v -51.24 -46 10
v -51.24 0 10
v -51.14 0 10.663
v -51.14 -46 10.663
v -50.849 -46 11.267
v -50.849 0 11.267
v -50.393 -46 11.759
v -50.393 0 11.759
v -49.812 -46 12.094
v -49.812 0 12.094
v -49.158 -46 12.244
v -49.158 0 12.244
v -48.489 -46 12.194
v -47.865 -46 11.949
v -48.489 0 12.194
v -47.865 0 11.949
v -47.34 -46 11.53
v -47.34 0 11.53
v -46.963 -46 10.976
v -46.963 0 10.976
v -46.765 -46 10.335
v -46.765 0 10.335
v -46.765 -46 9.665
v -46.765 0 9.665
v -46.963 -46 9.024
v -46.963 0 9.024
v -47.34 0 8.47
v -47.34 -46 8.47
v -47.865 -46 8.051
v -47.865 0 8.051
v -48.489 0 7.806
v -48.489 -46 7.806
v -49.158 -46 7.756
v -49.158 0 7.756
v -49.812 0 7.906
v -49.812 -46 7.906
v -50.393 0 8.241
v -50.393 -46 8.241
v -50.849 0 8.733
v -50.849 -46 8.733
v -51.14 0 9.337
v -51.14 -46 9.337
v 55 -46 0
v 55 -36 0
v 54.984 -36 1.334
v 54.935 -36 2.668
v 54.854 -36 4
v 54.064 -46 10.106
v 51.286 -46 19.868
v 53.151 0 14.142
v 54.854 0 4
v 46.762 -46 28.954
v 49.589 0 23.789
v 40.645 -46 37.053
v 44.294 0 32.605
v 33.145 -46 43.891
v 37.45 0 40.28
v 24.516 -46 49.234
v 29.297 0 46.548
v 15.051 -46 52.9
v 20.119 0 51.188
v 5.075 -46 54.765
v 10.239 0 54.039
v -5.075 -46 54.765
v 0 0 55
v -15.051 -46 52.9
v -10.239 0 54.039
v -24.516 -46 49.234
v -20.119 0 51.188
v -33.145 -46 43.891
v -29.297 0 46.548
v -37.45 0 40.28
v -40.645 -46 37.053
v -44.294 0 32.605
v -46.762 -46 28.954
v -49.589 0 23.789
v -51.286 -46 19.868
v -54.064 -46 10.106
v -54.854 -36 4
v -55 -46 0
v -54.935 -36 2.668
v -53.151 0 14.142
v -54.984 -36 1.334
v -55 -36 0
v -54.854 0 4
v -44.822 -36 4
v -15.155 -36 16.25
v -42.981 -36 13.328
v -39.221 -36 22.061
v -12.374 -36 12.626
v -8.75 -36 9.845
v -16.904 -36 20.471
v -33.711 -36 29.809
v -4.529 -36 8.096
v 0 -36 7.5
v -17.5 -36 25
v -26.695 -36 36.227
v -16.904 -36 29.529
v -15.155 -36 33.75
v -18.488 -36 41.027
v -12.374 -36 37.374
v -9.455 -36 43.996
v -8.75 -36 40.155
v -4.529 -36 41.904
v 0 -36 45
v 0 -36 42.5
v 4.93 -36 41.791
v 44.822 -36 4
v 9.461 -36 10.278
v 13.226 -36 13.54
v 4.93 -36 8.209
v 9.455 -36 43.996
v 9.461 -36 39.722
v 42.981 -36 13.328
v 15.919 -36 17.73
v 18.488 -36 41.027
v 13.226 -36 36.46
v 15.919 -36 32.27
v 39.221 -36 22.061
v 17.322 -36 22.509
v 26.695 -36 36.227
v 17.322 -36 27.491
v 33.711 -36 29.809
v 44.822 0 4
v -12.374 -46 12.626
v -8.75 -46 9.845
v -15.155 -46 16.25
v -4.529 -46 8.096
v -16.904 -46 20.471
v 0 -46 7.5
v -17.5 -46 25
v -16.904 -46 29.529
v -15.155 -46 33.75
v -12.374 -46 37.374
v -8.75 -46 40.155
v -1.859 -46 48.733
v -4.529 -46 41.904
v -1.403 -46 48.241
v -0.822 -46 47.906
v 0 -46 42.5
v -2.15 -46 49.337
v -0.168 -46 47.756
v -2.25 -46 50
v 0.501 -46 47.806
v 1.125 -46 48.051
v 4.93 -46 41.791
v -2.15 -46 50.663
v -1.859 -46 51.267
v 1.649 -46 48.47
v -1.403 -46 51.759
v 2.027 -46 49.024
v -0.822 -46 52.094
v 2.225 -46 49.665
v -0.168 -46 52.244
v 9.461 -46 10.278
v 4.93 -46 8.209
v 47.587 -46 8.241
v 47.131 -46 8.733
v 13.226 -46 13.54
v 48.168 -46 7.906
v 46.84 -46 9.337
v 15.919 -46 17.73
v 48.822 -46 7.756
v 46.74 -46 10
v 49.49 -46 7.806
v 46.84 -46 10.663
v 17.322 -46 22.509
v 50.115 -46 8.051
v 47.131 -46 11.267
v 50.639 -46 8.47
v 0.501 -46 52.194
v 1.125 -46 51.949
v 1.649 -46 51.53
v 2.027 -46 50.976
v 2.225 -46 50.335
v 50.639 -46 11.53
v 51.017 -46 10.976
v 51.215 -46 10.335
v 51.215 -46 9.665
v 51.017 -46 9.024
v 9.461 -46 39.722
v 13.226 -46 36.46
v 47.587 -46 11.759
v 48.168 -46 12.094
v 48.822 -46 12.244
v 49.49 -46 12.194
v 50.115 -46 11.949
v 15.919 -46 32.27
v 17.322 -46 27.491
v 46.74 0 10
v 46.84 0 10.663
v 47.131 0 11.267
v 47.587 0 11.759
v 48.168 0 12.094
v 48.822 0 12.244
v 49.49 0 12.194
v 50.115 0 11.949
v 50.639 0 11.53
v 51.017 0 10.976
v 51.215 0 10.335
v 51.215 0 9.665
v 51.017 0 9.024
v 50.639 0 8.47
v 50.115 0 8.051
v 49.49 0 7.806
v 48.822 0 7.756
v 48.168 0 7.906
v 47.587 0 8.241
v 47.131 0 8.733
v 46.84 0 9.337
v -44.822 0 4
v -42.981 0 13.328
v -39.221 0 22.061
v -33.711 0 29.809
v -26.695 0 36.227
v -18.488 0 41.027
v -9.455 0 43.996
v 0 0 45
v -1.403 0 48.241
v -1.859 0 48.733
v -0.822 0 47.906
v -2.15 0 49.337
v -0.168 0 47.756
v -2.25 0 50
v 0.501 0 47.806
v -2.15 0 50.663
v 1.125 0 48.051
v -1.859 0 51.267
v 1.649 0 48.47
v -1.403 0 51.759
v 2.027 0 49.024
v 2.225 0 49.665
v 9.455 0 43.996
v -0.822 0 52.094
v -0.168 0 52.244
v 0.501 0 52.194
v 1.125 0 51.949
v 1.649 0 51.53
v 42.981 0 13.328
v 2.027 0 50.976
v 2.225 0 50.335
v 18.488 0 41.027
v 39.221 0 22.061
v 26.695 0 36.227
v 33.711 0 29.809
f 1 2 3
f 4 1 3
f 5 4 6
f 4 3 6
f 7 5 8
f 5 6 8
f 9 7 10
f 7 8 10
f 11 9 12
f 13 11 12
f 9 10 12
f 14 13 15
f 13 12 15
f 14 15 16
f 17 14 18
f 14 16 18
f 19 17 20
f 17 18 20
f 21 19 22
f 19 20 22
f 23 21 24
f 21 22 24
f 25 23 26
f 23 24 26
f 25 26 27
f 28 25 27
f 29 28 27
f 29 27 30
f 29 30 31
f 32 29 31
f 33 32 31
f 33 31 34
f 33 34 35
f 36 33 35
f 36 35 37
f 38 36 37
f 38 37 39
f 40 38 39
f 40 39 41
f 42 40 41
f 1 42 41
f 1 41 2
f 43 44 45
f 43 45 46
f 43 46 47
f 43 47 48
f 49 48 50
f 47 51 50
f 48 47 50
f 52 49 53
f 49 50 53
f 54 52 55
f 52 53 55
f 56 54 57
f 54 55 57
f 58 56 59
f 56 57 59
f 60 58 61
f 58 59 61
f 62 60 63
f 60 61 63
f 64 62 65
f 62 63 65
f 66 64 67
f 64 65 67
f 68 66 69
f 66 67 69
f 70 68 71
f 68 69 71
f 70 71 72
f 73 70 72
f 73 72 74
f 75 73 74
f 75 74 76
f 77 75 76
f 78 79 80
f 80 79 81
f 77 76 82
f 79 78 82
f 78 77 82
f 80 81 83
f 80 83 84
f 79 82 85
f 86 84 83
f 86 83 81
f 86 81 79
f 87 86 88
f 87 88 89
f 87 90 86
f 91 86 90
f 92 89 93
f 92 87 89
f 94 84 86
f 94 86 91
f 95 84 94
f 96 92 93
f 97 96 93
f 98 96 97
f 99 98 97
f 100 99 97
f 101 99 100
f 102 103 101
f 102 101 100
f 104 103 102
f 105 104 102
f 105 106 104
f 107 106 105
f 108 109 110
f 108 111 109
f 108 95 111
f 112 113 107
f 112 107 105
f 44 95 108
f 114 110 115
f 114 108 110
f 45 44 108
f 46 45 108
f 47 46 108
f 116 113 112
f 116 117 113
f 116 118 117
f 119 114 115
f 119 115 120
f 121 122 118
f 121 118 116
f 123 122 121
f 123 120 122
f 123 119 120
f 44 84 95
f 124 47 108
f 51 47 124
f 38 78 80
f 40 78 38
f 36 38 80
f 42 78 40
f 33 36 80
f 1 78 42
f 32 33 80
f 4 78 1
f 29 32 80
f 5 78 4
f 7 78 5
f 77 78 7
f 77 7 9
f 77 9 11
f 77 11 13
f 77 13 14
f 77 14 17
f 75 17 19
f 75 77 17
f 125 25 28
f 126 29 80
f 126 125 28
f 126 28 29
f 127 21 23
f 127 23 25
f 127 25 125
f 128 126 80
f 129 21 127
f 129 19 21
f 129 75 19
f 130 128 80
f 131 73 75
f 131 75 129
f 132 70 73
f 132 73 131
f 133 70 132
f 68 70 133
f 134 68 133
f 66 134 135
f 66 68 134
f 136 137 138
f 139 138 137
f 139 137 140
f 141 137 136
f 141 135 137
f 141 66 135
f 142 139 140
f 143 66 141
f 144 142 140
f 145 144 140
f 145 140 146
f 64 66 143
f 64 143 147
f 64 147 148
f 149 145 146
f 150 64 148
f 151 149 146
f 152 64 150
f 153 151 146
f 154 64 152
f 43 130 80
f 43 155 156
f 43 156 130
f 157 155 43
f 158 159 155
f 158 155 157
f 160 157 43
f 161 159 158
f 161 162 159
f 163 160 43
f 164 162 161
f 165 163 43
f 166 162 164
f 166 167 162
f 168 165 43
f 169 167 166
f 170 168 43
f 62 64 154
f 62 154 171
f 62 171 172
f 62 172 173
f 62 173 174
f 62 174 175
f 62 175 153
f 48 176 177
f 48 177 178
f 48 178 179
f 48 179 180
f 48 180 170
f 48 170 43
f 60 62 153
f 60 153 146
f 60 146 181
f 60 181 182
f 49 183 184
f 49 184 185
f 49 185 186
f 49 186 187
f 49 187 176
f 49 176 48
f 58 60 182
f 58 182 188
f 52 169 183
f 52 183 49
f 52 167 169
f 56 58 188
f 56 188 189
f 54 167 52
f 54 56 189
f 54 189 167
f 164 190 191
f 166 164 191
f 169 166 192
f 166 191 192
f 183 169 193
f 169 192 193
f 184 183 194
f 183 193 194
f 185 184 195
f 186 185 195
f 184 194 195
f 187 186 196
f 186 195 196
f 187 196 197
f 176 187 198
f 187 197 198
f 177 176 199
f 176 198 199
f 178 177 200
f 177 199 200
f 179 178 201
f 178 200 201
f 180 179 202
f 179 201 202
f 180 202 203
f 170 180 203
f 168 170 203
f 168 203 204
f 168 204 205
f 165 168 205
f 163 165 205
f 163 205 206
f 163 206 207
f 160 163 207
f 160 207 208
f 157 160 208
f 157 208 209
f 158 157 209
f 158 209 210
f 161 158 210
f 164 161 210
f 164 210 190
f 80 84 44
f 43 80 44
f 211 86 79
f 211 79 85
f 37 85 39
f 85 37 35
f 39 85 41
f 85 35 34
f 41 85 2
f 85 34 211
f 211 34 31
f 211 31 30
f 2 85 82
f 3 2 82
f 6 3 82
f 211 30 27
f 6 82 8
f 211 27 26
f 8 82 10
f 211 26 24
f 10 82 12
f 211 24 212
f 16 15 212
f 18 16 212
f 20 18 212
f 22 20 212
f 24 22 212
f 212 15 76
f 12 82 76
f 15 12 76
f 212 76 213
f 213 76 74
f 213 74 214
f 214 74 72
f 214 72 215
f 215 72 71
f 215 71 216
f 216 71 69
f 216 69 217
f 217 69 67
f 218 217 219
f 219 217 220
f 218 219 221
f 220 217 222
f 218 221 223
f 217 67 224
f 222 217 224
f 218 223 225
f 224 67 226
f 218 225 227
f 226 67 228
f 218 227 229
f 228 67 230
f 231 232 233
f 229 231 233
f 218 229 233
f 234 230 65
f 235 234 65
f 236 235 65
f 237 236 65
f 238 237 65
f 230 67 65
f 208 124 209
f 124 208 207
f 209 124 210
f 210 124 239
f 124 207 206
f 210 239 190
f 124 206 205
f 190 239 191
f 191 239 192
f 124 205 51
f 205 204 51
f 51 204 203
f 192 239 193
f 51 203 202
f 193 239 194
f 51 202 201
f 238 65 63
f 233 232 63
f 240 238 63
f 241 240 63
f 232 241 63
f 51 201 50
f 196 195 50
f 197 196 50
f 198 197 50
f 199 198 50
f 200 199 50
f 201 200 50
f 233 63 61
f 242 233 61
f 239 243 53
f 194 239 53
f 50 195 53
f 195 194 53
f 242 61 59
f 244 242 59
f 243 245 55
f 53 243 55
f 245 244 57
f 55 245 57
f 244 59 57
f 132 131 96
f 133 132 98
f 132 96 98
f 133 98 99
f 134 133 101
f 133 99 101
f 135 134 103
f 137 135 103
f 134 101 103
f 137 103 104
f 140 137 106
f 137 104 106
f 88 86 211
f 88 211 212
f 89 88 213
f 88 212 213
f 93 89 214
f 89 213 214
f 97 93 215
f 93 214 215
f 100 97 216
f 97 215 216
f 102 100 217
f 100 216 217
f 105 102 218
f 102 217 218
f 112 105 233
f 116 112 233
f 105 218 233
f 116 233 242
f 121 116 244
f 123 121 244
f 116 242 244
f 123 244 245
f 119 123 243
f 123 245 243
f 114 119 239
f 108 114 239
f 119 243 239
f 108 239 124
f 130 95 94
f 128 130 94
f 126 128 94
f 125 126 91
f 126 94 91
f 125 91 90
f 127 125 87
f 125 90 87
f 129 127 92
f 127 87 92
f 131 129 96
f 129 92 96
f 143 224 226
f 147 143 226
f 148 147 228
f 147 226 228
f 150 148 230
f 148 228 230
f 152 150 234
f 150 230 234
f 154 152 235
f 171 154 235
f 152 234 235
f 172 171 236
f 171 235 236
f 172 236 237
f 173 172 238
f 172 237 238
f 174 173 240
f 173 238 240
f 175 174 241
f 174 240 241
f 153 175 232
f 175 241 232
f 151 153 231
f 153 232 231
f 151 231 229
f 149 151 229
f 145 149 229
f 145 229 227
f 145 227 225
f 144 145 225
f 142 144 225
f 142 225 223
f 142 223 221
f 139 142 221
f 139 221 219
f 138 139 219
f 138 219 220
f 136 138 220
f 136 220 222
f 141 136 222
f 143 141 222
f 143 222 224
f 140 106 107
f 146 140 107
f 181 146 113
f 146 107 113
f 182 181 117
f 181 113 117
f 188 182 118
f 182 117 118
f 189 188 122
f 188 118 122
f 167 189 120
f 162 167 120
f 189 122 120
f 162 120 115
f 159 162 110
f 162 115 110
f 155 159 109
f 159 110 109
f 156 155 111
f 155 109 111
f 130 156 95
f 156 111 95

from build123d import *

# Parameters (mm, degrees)
F1_DEPTH = 46
F3_DEPTH = 36
F4_W     = 36
F4_H     = 4
F5_DEPTH = 60
F7_DEPTH = 25
F9_D     = 4.5


with BuildPart() as f1:
    # F0 (on Front) → F1 (new body)
    with BuildSketch(Plane.XZ):
        with BuildLine():
            Line((-55, 0), (55, 0))
            ThreePointArc((55, 0), (0, 55), (-55, 0))
        make_face()
    extrude(amount=F1_DEPTH)

    # F2 (on face) → F3 (cut)
    with BuildSketch(Plane(origin=(0, 0, 0), x_dir=(-1, 0, 0), z_dir=(0, 1, 0))):
        with BuildLine():
            Line((-45, 0), (45, 0))
            ThreePointArc((45, 0), (0, 45), (-45, 0))
        make_face()
    extrude(amount=-F3_DEPTH, mode=Mode.SUBTRACT)

    # F4 (on Right) → F5 (cut, symmetric)
    with BuildSketch(Plane.YZ):
        with Locations((-18, 2)):
            Rectangle(F4_W, F4_H)
    extrude(amount=F5_DEPTH, both=True, mode=Mode.SUBTRACT)

    # F6 (on face) → F7 (cut)
    with BuildSketch(Plane(origin=(0, -36, 0), x_dir=(-1, 0, 0), z_dir=(0, 1, 0))):
        with BuildLine():
            ThreePointArc((0, 7.5), (12.3743686708, 12.6256313292), (17.5, 25))
            ThreePointArc((17.5, 25), (12.3743686708, 37.3743686708), (0, 42.5))
            Line((0, 42.5), (0, 7.5))
        make_face()
        with BuildLine():
            Line((0, 7.5), (0, 42.5))
            ThreePointArc((0, 42.5), (-17.5, 25), (0, 7.5))
        make_face()
    extrude(amount=-F7_DEPTH, mode=Mode.SUBTRACT)

    # F9 (through all)
    with Locations(Plane.XZ.offset(46)):
        with Locations((48.9897948557, 10), (0, 50), (-48.9897948557, 10)):
            Hole(F9_D / 2)


solid = f1.part
